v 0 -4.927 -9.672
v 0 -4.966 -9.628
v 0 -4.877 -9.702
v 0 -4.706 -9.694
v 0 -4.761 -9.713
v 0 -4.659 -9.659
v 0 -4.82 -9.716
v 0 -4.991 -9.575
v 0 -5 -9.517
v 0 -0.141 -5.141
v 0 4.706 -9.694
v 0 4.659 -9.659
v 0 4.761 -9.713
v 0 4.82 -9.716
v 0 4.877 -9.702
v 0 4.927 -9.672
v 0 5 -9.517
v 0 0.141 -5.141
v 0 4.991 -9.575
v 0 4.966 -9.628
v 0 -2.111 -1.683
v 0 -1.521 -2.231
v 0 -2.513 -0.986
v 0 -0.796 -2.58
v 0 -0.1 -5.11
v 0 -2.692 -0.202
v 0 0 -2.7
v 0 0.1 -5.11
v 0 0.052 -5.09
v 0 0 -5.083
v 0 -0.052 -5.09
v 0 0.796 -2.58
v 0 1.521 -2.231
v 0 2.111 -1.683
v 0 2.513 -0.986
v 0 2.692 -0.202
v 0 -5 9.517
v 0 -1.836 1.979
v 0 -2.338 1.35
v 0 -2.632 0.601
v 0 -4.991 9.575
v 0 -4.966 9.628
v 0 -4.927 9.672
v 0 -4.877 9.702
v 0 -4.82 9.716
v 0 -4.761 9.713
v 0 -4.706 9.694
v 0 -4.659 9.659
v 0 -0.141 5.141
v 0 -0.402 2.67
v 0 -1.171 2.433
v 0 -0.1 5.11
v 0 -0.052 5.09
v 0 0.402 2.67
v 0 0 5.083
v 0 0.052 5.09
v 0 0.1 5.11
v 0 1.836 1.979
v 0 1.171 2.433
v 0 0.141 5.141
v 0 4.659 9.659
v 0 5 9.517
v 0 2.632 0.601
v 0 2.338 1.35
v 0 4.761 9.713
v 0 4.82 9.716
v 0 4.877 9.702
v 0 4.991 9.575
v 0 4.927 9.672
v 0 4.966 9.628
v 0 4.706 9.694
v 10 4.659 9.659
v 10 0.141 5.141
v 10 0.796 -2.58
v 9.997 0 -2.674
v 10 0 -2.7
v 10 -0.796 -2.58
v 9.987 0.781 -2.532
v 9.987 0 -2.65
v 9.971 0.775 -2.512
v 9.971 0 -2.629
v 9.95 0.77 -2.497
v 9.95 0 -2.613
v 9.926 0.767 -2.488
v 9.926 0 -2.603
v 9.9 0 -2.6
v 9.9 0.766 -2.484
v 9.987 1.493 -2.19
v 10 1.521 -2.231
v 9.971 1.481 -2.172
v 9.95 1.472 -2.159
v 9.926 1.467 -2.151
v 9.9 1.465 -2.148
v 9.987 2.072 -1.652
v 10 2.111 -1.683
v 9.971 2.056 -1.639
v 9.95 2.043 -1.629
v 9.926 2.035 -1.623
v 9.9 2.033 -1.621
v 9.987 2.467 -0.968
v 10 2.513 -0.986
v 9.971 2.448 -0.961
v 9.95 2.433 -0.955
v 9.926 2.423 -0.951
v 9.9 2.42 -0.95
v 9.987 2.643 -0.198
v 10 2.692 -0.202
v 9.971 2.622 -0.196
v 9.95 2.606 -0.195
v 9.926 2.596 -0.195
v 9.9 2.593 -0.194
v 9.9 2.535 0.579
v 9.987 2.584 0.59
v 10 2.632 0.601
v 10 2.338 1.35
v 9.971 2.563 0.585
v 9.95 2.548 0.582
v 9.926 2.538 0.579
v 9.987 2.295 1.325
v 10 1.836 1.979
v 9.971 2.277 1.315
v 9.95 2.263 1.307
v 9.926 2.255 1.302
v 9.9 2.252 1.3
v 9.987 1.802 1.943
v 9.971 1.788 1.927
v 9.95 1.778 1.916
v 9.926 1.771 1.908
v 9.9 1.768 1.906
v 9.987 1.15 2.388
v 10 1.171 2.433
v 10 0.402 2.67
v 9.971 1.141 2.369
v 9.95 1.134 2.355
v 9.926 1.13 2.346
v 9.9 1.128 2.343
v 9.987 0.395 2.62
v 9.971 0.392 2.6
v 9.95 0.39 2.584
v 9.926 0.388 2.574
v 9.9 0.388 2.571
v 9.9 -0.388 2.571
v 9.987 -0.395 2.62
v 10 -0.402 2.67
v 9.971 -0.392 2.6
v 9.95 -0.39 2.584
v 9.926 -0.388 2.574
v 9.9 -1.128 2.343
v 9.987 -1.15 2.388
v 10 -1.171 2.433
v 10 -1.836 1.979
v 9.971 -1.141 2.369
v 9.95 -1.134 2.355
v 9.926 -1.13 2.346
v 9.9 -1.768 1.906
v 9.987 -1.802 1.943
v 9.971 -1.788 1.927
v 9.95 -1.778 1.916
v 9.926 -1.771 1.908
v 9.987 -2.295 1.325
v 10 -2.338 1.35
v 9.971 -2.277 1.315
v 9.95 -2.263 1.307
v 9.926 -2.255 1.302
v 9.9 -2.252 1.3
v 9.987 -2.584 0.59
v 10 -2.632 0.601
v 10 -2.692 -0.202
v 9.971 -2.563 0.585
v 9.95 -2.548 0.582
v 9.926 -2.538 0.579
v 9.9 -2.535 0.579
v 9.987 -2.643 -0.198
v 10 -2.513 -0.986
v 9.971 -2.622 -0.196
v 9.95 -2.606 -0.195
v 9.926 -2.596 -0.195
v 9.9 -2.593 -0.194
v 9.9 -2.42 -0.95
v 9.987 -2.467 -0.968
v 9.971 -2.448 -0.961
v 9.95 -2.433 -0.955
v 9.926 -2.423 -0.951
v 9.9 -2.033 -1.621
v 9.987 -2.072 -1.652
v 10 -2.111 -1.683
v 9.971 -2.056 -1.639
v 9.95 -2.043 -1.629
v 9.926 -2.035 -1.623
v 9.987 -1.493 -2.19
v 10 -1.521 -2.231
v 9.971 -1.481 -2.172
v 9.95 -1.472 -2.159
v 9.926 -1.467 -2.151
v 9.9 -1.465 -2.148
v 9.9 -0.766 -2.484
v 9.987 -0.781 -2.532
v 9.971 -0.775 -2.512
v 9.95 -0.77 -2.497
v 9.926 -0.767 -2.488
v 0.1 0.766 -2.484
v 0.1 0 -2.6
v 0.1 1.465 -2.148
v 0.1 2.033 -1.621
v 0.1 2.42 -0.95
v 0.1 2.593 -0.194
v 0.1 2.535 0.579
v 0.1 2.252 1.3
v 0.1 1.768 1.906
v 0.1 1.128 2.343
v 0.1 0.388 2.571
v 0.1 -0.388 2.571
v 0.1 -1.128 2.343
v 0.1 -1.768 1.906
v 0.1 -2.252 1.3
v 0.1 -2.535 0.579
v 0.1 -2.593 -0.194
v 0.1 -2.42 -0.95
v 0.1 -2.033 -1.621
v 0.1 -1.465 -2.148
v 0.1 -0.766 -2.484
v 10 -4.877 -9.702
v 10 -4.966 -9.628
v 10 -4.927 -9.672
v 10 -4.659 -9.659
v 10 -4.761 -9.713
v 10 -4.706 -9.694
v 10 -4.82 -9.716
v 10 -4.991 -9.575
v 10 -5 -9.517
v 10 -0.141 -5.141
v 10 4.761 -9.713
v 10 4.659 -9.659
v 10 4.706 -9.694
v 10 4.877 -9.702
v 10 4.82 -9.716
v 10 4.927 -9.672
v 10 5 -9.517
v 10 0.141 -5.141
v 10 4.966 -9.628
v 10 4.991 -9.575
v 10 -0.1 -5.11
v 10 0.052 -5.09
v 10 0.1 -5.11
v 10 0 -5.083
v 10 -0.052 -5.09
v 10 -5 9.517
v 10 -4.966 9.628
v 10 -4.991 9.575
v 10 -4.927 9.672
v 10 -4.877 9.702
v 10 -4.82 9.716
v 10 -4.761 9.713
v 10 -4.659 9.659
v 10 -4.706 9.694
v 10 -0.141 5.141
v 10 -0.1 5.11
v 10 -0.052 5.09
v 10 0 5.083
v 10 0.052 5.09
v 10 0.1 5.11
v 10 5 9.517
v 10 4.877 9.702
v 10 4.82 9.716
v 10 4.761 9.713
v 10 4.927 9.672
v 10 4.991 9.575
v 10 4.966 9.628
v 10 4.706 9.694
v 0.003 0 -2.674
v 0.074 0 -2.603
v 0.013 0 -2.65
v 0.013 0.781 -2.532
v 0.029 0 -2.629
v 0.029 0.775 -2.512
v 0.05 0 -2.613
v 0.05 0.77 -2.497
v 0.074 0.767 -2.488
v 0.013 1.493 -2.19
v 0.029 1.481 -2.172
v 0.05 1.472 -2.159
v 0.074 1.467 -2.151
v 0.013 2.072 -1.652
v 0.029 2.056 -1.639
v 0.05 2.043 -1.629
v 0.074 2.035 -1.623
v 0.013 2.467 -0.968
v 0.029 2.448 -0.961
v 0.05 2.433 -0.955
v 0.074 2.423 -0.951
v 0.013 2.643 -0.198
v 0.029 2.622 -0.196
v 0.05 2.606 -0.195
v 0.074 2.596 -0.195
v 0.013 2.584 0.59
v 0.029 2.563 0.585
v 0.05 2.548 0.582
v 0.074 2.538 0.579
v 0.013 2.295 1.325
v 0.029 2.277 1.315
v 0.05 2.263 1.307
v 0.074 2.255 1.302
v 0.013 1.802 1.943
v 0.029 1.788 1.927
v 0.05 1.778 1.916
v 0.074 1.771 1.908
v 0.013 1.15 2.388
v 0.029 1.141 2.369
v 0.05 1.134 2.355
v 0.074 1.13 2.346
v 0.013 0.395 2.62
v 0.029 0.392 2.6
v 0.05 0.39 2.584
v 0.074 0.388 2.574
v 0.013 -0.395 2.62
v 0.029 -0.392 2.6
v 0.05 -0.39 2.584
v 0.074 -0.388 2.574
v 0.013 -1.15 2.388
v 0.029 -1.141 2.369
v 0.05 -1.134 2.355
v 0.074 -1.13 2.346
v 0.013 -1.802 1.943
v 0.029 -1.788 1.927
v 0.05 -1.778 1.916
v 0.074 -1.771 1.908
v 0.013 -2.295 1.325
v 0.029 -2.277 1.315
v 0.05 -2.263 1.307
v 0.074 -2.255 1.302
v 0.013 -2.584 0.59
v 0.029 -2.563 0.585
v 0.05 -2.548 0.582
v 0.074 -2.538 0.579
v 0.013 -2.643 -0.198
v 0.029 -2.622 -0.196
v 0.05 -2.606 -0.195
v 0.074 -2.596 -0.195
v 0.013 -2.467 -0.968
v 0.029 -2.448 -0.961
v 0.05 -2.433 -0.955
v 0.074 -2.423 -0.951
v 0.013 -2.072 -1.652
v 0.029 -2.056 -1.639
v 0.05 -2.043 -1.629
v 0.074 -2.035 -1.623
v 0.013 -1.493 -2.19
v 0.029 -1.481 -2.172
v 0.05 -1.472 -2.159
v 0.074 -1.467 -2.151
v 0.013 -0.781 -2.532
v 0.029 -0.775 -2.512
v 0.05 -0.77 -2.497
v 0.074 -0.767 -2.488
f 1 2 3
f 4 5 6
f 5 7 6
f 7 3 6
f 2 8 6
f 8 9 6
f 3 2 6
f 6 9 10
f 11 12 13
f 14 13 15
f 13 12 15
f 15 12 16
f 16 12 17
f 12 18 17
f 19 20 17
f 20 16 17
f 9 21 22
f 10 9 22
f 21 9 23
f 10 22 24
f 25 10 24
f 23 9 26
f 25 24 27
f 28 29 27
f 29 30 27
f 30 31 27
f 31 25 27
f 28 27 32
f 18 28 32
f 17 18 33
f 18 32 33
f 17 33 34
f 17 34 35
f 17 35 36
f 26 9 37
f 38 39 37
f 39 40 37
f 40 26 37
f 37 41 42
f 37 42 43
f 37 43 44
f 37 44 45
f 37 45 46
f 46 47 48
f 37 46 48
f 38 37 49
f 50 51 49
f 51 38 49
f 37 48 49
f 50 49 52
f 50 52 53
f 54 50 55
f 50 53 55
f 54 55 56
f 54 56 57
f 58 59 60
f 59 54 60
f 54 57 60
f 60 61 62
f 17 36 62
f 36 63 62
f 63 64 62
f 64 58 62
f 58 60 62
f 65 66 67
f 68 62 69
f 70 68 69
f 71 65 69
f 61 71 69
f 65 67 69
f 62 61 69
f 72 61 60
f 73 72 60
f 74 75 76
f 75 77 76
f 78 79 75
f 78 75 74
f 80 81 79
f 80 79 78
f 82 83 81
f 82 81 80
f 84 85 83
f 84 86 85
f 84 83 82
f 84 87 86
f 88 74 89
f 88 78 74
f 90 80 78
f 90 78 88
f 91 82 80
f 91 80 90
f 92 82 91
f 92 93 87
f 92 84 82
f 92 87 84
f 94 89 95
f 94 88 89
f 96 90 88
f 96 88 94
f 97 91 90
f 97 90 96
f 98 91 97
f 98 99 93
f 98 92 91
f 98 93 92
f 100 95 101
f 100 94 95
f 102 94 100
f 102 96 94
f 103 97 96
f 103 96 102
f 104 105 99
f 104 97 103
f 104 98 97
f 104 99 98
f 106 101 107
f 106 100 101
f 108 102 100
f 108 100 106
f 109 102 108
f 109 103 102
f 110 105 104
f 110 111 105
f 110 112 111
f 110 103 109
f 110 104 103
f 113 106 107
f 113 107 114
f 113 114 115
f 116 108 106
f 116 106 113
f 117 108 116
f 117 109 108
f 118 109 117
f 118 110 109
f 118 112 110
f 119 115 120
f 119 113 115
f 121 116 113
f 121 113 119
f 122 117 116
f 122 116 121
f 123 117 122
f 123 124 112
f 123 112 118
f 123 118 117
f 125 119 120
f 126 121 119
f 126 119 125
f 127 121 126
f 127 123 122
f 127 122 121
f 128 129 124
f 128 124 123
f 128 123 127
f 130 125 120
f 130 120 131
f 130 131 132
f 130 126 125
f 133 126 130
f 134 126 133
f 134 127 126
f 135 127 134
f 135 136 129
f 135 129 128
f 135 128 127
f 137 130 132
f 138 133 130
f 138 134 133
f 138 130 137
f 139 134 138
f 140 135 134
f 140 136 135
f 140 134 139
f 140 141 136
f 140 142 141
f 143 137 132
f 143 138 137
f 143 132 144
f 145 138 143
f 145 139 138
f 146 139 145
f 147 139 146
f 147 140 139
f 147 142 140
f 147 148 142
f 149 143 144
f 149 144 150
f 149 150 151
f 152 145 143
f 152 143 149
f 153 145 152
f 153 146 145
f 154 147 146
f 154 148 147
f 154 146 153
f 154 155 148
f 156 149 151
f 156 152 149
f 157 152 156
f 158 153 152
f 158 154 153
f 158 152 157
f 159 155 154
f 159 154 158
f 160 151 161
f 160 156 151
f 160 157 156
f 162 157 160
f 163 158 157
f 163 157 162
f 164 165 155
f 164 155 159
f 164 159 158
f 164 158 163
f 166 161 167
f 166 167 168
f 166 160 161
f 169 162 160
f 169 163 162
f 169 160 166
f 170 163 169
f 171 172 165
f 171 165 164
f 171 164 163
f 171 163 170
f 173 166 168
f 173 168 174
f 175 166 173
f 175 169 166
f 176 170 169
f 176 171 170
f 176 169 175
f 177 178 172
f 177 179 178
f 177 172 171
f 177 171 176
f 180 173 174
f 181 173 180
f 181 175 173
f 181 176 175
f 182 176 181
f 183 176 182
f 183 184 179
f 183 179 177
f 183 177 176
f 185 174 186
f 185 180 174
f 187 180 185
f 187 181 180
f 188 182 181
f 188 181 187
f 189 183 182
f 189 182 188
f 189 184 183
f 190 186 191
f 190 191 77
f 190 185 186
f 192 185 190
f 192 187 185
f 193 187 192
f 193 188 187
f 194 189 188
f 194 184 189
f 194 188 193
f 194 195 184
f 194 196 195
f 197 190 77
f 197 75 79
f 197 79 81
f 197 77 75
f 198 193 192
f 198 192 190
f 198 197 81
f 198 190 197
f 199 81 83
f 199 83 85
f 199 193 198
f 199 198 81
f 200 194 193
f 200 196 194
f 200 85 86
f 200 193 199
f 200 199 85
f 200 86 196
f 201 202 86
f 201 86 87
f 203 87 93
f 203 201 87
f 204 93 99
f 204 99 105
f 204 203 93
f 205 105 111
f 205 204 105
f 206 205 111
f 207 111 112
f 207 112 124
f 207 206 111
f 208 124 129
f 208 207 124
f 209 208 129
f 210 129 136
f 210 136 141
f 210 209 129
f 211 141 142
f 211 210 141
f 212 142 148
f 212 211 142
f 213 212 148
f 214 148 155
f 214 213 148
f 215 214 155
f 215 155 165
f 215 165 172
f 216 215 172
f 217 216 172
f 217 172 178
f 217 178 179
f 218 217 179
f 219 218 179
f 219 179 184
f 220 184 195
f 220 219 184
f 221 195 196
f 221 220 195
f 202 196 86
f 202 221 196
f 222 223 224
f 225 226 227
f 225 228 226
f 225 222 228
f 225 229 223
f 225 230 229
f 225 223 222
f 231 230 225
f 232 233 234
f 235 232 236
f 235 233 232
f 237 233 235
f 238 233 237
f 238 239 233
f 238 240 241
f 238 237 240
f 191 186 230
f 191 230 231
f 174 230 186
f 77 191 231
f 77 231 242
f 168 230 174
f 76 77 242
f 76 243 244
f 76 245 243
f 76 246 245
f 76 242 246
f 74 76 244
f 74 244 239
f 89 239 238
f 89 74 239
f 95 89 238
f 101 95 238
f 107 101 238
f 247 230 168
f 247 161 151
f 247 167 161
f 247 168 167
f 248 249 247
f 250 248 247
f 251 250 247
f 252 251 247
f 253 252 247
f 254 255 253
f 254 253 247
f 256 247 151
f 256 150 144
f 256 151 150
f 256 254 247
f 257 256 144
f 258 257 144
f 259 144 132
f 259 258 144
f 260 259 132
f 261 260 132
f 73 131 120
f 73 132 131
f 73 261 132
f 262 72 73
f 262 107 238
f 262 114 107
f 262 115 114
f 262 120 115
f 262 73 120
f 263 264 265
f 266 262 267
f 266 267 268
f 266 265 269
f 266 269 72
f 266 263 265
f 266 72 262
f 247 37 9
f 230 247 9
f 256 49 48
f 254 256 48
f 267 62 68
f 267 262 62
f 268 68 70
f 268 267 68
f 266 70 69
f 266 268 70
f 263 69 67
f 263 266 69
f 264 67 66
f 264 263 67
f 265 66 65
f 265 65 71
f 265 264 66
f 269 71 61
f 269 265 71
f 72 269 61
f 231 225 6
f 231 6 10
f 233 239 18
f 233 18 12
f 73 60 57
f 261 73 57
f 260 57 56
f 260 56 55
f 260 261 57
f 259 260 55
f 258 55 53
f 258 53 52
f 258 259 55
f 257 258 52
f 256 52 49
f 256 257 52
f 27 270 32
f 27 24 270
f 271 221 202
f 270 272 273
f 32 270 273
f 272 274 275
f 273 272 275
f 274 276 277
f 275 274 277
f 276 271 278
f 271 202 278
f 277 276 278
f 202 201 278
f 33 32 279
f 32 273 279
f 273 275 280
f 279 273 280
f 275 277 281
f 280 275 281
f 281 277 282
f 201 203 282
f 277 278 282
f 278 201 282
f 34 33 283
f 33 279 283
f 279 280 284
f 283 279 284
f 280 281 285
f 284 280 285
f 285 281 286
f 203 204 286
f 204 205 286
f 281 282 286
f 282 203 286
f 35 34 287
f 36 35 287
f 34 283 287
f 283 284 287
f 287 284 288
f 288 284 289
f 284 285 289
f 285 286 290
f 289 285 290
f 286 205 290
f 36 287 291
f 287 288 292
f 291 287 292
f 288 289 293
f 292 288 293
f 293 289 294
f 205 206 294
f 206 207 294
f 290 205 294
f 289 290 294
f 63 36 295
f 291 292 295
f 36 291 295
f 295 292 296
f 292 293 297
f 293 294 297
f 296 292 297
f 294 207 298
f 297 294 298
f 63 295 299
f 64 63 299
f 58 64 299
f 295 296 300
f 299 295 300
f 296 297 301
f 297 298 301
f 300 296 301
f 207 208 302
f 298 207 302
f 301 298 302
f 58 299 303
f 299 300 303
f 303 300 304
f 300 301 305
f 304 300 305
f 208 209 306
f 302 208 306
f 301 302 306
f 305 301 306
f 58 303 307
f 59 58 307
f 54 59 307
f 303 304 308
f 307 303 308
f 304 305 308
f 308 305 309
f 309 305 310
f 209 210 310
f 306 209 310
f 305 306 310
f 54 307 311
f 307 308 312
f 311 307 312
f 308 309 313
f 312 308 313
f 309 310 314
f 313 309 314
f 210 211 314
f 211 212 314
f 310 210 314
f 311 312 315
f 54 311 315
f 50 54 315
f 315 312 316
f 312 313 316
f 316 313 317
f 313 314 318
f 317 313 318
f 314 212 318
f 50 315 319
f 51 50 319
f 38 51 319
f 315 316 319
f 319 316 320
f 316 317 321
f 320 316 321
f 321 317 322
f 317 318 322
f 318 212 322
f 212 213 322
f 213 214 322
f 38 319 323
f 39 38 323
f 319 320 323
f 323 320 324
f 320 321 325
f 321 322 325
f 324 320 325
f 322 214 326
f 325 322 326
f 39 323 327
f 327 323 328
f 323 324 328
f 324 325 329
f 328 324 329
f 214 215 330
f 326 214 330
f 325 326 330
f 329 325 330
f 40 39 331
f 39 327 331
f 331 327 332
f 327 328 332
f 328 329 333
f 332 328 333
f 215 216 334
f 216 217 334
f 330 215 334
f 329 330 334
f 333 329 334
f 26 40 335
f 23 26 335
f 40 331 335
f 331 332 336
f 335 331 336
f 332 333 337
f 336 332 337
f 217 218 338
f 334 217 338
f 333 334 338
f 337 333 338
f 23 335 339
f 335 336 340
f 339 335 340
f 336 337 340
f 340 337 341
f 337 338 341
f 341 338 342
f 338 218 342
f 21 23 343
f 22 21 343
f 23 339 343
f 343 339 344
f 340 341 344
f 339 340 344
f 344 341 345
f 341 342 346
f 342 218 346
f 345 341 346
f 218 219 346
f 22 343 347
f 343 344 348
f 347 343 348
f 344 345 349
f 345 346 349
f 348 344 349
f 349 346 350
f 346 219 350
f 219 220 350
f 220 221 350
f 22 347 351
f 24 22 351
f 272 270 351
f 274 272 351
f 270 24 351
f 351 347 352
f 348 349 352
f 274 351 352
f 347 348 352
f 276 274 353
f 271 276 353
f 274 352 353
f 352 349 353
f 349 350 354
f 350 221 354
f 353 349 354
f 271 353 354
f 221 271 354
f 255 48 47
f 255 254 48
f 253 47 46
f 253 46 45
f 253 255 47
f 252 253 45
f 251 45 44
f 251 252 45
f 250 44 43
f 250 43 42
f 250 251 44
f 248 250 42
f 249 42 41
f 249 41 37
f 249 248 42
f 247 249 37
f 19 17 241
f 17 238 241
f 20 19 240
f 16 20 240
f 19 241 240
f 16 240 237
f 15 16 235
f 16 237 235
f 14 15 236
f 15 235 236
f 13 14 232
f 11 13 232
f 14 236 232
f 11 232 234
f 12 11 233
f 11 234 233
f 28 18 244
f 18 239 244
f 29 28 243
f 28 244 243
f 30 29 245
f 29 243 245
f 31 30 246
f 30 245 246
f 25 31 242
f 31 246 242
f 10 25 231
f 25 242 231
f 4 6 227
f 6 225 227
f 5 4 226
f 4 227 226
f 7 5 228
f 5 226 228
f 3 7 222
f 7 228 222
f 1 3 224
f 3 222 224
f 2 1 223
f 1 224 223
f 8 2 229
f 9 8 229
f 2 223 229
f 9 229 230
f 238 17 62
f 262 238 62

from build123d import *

# Parameters (mm, degrees)
CROQUIS1_R              = 2.6
SALIENTE_EXTRUIR1_DEPTH = 10
REDONDEO1_R             = 0.2
REDONDEO2_R             = 0.1


with BuildPart() as part:
    # Croquis1 → Saliente-Extruir1 (new body)
    with BuildSketch(Plane.YZ):
        Polygon((5, -10), (5, 10), (0, 5.00000025), (-5, 10), (-5, -10), (0, -4.99999975), align=None)
        with Locations(Location((0, 0, 0), (0, 0, 270))):
            Circle(CROQUIS1_R, mode=Mode.SUBTRACT)
    extrude(amount=SALIENTE_EXTRUIR1_DEPTH)

    # Redondeo1
    redondeo1_edges = [part.edges().sort_by_distance(p)[0] for p in [
        (5, 0, -4.99999975),
        (5, -5, -10),
        (5, -5, 10),
        (5, 0, 5.00000025),
        (5, 5, 10),
        (5, 5, -10),
    ]]
    fillet(redondeo1_edges, radius=REDONDEO1_R)

    # Redondeo2
    redondeo2_edges = [part.edges().sort_by_distance(p)[0] for p in [
        (0, 0, 2.6),
        (10, 0, 2.6),
    ]]
    fillet(redondeo2_edges, radius=REDONDEO2_R)


solid = part.part
